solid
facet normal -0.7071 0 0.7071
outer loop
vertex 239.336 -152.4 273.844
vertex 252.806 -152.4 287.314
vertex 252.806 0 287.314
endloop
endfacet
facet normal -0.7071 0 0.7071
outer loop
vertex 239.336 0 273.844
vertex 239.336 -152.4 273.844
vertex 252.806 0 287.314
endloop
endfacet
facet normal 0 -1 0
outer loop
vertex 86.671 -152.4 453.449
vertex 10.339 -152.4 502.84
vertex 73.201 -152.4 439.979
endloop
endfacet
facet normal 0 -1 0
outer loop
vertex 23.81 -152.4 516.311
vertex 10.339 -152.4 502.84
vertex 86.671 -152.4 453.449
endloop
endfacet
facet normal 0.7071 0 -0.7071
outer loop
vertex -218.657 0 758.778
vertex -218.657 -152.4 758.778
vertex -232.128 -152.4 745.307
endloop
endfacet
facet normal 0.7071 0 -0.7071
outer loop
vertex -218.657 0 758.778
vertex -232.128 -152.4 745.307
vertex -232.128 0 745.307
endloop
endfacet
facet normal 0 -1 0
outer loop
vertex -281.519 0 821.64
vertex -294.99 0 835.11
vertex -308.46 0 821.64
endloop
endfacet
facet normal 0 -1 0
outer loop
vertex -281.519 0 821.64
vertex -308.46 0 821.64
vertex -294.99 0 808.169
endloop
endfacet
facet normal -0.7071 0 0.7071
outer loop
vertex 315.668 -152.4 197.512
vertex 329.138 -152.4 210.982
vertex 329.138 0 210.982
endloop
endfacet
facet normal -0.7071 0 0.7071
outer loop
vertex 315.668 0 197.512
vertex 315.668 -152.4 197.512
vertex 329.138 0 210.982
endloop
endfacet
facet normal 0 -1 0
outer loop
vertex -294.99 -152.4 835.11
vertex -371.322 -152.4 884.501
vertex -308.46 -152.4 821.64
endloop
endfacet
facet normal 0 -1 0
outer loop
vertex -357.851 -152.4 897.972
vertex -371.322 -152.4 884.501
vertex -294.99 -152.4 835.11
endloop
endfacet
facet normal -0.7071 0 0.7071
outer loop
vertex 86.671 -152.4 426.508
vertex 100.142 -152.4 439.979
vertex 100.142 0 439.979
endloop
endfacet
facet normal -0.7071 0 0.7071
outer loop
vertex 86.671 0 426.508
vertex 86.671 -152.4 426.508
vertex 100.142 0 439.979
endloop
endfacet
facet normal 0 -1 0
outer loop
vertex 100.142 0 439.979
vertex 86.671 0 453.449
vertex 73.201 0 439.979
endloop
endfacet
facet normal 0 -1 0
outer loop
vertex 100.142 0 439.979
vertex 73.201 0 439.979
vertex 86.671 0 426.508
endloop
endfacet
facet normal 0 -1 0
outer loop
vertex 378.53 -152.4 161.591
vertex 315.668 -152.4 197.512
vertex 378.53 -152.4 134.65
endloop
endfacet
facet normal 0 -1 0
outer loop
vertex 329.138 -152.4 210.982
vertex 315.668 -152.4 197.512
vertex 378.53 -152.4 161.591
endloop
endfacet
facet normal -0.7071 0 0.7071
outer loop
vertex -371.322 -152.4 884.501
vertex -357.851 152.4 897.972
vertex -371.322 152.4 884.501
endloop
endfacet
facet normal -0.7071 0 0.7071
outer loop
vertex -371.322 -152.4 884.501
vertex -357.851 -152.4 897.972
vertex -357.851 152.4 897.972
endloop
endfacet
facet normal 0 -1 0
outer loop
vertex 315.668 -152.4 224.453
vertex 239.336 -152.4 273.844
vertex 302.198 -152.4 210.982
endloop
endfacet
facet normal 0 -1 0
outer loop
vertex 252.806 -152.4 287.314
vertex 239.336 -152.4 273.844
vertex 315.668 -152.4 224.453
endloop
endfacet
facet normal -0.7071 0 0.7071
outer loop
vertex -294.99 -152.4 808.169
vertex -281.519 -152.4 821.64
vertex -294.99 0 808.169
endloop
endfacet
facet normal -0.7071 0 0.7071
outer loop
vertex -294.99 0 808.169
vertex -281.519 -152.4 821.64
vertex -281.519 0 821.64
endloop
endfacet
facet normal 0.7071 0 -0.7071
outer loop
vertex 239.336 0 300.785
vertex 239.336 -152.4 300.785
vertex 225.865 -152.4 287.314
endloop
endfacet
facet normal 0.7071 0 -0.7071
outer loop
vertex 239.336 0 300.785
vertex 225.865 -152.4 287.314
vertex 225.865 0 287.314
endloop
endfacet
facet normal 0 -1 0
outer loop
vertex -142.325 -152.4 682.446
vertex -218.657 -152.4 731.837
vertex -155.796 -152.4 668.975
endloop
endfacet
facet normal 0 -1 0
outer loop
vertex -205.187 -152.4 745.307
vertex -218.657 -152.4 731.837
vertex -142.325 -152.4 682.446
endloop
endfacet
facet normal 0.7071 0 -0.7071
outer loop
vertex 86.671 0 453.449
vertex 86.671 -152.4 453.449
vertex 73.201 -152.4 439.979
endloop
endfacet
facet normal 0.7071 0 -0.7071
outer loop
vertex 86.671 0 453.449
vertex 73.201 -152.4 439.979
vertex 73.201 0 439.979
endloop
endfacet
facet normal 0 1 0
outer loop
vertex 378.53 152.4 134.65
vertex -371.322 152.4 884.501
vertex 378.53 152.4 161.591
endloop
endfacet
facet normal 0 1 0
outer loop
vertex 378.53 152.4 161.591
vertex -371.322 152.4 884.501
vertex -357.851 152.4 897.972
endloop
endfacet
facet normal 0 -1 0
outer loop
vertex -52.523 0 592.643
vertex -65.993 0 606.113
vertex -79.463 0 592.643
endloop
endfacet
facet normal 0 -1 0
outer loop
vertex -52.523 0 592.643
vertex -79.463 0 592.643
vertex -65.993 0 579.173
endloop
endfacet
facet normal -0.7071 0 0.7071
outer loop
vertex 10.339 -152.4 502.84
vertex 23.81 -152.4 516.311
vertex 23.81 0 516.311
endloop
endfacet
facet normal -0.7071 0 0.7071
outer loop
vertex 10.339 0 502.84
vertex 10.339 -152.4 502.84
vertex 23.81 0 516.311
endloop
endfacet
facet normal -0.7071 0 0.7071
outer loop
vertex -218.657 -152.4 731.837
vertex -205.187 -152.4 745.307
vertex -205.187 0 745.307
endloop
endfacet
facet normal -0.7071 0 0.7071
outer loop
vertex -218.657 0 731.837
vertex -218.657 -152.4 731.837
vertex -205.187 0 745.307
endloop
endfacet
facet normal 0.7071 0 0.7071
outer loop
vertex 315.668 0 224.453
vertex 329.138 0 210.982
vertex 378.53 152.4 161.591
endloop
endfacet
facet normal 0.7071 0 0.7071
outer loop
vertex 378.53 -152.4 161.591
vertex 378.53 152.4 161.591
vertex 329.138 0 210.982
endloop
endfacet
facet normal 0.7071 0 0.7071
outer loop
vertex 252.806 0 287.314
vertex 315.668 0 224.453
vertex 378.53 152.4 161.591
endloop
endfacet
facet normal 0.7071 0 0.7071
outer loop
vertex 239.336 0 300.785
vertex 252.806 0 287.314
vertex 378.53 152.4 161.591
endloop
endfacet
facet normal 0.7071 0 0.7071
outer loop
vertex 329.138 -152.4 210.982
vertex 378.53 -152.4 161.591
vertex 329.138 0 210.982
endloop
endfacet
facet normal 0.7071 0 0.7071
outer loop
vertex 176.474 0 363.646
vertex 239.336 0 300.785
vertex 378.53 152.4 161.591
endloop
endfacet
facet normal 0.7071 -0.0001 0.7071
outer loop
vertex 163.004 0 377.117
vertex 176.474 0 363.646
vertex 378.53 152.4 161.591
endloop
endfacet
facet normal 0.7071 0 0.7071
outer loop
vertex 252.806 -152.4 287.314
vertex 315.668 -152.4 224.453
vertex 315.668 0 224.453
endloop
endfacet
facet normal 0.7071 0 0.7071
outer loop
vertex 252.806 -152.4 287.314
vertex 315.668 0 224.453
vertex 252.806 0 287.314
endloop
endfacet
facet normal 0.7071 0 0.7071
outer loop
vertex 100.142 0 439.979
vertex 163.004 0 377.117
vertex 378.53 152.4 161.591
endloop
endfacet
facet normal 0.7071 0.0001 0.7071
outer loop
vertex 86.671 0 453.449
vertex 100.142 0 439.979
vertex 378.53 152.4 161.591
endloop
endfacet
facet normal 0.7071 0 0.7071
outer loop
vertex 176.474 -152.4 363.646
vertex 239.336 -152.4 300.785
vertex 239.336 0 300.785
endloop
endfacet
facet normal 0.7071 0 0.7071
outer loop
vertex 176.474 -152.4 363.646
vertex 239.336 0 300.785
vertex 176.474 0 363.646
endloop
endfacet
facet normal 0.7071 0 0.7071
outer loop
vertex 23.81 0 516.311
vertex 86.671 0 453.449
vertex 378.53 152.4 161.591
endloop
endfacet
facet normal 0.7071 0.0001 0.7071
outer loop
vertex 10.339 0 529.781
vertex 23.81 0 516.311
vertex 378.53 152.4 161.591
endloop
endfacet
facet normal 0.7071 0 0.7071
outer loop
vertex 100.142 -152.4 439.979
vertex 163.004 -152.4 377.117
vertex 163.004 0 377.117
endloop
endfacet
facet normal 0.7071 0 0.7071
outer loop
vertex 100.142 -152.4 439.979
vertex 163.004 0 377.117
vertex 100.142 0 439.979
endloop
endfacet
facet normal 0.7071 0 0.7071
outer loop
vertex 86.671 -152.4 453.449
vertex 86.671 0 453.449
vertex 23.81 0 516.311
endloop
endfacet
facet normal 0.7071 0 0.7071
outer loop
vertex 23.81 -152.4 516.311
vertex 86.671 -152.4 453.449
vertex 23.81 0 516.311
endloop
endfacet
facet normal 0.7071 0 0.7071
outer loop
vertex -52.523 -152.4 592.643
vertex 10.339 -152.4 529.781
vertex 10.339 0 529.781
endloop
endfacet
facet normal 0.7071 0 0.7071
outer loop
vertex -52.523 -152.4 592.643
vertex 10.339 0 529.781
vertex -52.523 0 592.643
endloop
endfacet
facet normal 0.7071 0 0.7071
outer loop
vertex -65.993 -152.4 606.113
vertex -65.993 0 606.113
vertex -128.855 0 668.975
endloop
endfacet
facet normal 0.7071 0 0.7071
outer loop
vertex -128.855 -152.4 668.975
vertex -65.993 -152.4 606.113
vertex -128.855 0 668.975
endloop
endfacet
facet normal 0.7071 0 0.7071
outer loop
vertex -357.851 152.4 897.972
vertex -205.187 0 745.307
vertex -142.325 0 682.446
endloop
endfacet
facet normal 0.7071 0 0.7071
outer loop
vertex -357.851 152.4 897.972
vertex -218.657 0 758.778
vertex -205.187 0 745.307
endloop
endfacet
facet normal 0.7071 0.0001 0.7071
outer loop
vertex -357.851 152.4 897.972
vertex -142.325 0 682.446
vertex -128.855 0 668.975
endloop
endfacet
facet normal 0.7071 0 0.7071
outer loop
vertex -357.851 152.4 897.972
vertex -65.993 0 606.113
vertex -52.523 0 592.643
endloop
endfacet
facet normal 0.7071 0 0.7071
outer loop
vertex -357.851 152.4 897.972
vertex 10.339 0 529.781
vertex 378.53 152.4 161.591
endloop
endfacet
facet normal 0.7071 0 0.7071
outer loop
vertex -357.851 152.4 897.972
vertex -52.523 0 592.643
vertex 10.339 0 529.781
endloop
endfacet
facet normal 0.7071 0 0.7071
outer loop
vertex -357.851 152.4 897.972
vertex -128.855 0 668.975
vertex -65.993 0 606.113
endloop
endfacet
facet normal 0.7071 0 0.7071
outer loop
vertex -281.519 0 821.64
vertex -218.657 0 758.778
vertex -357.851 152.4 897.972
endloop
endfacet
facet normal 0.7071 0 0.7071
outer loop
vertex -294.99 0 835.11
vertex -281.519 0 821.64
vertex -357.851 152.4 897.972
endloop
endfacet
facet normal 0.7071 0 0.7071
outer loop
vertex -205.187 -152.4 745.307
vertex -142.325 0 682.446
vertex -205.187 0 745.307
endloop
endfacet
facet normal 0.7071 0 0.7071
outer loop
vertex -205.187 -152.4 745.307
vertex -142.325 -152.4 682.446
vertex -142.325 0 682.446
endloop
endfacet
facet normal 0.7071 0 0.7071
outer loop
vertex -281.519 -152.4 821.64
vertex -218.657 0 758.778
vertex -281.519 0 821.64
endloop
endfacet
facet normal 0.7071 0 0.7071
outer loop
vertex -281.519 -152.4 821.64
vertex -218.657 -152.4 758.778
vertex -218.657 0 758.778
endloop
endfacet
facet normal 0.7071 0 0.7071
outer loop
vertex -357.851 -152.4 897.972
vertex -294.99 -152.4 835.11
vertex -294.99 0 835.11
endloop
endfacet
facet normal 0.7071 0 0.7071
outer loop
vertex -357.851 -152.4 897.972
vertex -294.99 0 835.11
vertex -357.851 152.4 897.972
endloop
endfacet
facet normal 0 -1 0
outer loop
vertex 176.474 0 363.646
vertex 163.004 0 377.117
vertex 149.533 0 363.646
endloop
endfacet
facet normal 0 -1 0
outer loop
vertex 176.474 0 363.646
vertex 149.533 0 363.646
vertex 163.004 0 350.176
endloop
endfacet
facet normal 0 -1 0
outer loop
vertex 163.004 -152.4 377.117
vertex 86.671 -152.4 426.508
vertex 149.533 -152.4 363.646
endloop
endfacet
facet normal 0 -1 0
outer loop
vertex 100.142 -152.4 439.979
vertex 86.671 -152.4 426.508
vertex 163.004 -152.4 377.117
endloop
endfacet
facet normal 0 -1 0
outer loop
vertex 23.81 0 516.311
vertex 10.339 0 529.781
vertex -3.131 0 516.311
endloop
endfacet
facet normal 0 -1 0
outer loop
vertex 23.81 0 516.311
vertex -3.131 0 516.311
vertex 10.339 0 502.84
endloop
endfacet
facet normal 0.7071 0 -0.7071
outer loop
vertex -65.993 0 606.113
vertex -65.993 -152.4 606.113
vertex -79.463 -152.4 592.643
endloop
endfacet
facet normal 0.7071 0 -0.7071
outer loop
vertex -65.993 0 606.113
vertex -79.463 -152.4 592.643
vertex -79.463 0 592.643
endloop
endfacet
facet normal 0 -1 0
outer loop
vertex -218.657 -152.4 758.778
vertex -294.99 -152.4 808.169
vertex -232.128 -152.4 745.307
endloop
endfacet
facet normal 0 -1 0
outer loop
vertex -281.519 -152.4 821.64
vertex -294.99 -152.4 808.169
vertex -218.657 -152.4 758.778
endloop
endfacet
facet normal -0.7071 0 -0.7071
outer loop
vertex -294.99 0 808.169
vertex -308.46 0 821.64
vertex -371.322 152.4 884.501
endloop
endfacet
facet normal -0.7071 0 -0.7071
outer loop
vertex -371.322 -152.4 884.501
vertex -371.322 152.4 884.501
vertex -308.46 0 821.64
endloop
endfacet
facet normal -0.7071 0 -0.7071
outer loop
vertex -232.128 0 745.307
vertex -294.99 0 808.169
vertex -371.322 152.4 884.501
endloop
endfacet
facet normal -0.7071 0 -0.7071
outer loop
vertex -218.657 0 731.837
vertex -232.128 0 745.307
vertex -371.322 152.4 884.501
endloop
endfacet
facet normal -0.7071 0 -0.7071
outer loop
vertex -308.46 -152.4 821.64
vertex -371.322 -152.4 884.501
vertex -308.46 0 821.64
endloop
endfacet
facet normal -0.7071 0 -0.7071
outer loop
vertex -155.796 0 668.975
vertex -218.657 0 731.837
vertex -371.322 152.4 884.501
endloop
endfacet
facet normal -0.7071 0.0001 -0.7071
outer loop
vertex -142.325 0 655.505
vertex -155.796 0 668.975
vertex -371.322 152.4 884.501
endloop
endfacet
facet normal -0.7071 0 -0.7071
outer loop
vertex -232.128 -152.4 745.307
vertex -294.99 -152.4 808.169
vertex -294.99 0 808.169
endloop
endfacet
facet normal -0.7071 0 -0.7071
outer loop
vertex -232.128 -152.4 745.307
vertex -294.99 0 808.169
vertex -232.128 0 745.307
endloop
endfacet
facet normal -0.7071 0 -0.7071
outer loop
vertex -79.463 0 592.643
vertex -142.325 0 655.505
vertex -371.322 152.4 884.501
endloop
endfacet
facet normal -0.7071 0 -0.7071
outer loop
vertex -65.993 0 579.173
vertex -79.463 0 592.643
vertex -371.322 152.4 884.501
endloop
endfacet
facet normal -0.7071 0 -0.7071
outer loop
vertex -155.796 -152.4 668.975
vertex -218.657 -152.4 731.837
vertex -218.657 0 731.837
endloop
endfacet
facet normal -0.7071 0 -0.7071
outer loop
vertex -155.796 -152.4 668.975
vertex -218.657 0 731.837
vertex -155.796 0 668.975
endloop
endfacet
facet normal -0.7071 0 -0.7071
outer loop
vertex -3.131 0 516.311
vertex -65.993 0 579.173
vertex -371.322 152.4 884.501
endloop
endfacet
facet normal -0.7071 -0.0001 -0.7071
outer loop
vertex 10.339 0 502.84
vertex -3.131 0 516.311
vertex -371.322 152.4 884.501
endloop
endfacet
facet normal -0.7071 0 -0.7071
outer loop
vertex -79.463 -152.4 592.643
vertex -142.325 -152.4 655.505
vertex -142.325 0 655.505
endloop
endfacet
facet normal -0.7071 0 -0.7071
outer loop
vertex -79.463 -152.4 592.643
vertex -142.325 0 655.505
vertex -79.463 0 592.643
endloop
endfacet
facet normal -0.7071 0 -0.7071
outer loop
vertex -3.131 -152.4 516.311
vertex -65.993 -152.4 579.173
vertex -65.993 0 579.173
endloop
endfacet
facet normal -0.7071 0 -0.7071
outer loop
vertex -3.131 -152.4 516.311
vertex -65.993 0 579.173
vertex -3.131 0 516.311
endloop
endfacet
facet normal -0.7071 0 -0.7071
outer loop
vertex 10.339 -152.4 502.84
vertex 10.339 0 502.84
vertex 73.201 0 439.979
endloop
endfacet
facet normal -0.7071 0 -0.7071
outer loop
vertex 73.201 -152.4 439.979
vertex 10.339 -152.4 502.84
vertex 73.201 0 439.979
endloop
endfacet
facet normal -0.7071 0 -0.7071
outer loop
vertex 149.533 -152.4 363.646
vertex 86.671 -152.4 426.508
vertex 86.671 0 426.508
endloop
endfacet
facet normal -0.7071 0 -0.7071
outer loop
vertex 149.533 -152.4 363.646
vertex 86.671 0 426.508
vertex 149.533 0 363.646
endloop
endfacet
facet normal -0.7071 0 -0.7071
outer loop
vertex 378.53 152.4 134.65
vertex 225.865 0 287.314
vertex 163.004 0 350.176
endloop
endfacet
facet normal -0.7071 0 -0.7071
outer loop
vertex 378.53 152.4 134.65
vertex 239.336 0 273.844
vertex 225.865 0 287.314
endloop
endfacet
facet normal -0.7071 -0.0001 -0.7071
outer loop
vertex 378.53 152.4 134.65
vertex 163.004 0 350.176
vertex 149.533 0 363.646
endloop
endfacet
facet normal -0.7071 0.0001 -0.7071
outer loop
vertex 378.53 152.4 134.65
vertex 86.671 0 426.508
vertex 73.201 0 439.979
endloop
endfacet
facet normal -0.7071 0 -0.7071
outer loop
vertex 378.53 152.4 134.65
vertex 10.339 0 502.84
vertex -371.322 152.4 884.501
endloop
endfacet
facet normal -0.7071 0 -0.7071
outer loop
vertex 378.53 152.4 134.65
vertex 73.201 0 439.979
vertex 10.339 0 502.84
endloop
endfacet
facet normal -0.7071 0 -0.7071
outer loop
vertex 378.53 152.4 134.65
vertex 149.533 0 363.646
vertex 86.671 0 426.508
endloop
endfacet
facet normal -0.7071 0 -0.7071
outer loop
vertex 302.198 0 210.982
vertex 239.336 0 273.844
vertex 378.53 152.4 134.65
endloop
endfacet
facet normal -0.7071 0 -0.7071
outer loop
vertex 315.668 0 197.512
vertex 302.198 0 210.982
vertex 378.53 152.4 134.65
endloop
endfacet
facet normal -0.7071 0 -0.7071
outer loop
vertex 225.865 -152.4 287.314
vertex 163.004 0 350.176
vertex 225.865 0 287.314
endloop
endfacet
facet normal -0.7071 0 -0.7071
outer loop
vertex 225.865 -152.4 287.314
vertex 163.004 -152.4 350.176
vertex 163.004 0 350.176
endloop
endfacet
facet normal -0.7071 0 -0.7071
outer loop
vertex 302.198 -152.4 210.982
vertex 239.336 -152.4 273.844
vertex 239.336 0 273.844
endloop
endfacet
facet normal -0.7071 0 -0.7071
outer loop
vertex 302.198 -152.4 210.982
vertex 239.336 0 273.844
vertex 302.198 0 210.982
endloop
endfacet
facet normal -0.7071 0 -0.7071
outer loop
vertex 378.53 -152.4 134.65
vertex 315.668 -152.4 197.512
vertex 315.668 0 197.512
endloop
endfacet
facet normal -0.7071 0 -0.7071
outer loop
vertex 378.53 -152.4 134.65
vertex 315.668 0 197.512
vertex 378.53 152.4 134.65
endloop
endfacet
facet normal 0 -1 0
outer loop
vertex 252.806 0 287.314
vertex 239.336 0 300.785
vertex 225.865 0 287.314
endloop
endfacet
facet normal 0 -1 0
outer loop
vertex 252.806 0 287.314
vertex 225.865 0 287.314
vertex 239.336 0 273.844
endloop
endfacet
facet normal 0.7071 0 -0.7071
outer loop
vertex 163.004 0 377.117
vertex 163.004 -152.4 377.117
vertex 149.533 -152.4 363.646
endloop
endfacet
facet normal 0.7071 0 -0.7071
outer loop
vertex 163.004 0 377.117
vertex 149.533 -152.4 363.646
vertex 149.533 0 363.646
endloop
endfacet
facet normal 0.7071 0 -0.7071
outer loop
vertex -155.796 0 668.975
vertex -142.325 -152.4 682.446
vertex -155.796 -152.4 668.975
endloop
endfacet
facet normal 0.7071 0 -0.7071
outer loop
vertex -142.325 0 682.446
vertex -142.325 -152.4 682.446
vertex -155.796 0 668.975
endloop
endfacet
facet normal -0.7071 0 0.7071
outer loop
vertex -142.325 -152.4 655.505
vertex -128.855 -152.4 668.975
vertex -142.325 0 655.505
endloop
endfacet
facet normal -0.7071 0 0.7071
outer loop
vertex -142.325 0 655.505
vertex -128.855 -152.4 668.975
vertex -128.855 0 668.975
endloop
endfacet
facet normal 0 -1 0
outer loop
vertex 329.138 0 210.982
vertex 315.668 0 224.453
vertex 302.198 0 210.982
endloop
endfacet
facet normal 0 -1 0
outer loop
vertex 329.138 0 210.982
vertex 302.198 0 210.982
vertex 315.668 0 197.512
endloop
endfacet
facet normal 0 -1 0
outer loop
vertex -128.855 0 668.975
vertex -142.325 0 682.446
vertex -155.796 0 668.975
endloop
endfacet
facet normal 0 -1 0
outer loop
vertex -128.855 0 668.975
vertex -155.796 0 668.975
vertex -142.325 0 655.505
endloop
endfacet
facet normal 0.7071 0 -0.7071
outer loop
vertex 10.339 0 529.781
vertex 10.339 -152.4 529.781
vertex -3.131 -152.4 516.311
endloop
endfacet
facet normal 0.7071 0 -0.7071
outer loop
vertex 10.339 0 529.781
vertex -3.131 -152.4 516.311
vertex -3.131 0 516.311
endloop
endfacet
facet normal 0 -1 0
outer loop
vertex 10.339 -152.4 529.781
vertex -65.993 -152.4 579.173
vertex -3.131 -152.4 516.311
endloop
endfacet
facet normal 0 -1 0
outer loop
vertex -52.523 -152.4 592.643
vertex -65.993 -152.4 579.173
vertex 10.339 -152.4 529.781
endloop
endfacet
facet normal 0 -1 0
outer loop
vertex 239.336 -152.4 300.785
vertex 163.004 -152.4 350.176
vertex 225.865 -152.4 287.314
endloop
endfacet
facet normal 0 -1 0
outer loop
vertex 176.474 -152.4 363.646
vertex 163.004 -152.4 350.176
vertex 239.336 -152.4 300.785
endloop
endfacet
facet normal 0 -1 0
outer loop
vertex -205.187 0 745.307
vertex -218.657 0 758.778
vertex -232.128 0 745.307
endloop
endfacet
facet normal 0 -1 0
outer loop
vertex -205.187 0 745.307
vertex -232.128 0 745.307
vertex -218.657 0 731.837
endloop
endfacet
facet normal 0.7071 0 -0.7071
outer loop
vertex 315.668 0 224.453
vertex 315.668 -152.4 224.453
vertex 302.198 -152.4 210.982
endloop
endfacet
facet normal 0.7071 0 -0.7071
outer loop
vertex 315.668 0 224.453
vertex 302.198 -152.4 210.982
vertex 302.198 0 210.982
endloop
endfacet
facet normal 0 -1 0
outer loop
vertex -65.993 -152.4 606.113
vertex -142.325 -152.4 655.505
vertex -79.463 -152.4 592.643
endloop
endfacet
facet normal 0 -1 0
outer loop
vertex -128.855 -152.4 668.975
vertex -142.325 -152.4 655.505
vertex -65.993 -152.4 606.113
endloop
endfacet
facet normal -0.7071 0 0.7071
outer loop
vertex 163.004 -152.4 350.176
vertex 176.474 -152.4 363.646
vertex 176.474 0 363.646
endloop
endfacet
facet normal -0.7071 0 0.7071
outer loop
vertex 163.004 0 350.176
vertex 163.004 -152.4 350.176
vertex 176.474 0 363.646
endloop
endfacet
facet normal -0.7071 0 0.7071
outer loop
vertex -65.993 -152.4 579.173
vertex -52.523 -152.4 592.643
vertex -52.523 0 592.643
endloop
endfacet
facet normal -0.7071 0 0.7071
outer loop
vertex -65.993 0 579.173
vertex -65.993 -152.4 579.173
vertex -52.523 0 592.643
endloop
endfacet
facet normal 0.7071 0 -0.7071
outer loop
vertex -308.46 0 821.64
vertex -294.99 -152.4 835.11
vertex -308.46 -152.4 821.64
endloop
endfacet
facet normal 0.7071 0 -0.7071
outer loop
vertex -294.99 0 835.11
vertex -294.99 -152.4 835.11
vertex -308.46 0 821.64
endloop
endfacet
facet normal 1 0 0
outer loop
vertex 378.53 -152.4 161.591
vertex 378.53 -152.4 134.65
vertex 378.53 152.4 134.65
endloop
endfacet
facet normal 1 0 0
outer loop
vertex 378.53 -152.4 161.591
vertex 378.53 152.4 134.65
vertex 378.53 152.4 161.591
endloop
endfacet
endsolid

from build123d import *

# Parameters (mm, degrees)
F1_DEPTH = 152.4
F2_W     = 19.05
F2_H     = 152.4
F3_DEPTH = 19.05


with BuildPart() as f1:
    # F0 (on Front) → F1 (new body, symmetric)
    with BuildSketch(Plane.XZ):
        Polygon((-371.3216865451, 884.5013463886), (378.5296995641, 134.6499602793), (378.5296995641, 161.5907286425), (-357.8513023635, 897.9717305702), align=None)
    extrude(amount=F1_DEPTH, both=True)

    # F2 (on face) → F3 (cut)
    with BuildSketch(Plane(origin=(270.0602141033, 0, 270.0602141033), x_dir=(0.7071067812, 0, -0.7071067812), z_dir=(0.7071067812, 0, 0.7071067812))):
        with Locations((74.0240174423, -76.2)):
            Rectangle(F2_W, F2_H)
        with Locations((-33.9259825577, -76.2)):
            Rectangle(F2_W, F2_H)
        with Locations((-141.8759825577, -76.2)):
            Rectangle(F2_W, F2_H)
        with Locations((-249.8259825577, -76.2)):
            Rectangle(F2_W, F2_H)
        with Locations((-357.7759825577, -76.2)):
            Rectangle(F2_W, F2_H)
        with Locations((-465.7259825577, -76.2)):
            Rectangle(F2_W, F2_H)
        with Locations((-573.6759825577, -76.2)):
            Rectangle(F2_W, F2_H)
        with Locations((-681.6259825577, -76.2)):
            Rectangle(F2_W, F2_H)
        with Locations((-789.5759825577, -76.2)):
            Rectangle(F2_W, F2_H)
    extrude(amount=-F3_DEPTH, mode=Mode.SUBTRACT)


solid = f1.part
